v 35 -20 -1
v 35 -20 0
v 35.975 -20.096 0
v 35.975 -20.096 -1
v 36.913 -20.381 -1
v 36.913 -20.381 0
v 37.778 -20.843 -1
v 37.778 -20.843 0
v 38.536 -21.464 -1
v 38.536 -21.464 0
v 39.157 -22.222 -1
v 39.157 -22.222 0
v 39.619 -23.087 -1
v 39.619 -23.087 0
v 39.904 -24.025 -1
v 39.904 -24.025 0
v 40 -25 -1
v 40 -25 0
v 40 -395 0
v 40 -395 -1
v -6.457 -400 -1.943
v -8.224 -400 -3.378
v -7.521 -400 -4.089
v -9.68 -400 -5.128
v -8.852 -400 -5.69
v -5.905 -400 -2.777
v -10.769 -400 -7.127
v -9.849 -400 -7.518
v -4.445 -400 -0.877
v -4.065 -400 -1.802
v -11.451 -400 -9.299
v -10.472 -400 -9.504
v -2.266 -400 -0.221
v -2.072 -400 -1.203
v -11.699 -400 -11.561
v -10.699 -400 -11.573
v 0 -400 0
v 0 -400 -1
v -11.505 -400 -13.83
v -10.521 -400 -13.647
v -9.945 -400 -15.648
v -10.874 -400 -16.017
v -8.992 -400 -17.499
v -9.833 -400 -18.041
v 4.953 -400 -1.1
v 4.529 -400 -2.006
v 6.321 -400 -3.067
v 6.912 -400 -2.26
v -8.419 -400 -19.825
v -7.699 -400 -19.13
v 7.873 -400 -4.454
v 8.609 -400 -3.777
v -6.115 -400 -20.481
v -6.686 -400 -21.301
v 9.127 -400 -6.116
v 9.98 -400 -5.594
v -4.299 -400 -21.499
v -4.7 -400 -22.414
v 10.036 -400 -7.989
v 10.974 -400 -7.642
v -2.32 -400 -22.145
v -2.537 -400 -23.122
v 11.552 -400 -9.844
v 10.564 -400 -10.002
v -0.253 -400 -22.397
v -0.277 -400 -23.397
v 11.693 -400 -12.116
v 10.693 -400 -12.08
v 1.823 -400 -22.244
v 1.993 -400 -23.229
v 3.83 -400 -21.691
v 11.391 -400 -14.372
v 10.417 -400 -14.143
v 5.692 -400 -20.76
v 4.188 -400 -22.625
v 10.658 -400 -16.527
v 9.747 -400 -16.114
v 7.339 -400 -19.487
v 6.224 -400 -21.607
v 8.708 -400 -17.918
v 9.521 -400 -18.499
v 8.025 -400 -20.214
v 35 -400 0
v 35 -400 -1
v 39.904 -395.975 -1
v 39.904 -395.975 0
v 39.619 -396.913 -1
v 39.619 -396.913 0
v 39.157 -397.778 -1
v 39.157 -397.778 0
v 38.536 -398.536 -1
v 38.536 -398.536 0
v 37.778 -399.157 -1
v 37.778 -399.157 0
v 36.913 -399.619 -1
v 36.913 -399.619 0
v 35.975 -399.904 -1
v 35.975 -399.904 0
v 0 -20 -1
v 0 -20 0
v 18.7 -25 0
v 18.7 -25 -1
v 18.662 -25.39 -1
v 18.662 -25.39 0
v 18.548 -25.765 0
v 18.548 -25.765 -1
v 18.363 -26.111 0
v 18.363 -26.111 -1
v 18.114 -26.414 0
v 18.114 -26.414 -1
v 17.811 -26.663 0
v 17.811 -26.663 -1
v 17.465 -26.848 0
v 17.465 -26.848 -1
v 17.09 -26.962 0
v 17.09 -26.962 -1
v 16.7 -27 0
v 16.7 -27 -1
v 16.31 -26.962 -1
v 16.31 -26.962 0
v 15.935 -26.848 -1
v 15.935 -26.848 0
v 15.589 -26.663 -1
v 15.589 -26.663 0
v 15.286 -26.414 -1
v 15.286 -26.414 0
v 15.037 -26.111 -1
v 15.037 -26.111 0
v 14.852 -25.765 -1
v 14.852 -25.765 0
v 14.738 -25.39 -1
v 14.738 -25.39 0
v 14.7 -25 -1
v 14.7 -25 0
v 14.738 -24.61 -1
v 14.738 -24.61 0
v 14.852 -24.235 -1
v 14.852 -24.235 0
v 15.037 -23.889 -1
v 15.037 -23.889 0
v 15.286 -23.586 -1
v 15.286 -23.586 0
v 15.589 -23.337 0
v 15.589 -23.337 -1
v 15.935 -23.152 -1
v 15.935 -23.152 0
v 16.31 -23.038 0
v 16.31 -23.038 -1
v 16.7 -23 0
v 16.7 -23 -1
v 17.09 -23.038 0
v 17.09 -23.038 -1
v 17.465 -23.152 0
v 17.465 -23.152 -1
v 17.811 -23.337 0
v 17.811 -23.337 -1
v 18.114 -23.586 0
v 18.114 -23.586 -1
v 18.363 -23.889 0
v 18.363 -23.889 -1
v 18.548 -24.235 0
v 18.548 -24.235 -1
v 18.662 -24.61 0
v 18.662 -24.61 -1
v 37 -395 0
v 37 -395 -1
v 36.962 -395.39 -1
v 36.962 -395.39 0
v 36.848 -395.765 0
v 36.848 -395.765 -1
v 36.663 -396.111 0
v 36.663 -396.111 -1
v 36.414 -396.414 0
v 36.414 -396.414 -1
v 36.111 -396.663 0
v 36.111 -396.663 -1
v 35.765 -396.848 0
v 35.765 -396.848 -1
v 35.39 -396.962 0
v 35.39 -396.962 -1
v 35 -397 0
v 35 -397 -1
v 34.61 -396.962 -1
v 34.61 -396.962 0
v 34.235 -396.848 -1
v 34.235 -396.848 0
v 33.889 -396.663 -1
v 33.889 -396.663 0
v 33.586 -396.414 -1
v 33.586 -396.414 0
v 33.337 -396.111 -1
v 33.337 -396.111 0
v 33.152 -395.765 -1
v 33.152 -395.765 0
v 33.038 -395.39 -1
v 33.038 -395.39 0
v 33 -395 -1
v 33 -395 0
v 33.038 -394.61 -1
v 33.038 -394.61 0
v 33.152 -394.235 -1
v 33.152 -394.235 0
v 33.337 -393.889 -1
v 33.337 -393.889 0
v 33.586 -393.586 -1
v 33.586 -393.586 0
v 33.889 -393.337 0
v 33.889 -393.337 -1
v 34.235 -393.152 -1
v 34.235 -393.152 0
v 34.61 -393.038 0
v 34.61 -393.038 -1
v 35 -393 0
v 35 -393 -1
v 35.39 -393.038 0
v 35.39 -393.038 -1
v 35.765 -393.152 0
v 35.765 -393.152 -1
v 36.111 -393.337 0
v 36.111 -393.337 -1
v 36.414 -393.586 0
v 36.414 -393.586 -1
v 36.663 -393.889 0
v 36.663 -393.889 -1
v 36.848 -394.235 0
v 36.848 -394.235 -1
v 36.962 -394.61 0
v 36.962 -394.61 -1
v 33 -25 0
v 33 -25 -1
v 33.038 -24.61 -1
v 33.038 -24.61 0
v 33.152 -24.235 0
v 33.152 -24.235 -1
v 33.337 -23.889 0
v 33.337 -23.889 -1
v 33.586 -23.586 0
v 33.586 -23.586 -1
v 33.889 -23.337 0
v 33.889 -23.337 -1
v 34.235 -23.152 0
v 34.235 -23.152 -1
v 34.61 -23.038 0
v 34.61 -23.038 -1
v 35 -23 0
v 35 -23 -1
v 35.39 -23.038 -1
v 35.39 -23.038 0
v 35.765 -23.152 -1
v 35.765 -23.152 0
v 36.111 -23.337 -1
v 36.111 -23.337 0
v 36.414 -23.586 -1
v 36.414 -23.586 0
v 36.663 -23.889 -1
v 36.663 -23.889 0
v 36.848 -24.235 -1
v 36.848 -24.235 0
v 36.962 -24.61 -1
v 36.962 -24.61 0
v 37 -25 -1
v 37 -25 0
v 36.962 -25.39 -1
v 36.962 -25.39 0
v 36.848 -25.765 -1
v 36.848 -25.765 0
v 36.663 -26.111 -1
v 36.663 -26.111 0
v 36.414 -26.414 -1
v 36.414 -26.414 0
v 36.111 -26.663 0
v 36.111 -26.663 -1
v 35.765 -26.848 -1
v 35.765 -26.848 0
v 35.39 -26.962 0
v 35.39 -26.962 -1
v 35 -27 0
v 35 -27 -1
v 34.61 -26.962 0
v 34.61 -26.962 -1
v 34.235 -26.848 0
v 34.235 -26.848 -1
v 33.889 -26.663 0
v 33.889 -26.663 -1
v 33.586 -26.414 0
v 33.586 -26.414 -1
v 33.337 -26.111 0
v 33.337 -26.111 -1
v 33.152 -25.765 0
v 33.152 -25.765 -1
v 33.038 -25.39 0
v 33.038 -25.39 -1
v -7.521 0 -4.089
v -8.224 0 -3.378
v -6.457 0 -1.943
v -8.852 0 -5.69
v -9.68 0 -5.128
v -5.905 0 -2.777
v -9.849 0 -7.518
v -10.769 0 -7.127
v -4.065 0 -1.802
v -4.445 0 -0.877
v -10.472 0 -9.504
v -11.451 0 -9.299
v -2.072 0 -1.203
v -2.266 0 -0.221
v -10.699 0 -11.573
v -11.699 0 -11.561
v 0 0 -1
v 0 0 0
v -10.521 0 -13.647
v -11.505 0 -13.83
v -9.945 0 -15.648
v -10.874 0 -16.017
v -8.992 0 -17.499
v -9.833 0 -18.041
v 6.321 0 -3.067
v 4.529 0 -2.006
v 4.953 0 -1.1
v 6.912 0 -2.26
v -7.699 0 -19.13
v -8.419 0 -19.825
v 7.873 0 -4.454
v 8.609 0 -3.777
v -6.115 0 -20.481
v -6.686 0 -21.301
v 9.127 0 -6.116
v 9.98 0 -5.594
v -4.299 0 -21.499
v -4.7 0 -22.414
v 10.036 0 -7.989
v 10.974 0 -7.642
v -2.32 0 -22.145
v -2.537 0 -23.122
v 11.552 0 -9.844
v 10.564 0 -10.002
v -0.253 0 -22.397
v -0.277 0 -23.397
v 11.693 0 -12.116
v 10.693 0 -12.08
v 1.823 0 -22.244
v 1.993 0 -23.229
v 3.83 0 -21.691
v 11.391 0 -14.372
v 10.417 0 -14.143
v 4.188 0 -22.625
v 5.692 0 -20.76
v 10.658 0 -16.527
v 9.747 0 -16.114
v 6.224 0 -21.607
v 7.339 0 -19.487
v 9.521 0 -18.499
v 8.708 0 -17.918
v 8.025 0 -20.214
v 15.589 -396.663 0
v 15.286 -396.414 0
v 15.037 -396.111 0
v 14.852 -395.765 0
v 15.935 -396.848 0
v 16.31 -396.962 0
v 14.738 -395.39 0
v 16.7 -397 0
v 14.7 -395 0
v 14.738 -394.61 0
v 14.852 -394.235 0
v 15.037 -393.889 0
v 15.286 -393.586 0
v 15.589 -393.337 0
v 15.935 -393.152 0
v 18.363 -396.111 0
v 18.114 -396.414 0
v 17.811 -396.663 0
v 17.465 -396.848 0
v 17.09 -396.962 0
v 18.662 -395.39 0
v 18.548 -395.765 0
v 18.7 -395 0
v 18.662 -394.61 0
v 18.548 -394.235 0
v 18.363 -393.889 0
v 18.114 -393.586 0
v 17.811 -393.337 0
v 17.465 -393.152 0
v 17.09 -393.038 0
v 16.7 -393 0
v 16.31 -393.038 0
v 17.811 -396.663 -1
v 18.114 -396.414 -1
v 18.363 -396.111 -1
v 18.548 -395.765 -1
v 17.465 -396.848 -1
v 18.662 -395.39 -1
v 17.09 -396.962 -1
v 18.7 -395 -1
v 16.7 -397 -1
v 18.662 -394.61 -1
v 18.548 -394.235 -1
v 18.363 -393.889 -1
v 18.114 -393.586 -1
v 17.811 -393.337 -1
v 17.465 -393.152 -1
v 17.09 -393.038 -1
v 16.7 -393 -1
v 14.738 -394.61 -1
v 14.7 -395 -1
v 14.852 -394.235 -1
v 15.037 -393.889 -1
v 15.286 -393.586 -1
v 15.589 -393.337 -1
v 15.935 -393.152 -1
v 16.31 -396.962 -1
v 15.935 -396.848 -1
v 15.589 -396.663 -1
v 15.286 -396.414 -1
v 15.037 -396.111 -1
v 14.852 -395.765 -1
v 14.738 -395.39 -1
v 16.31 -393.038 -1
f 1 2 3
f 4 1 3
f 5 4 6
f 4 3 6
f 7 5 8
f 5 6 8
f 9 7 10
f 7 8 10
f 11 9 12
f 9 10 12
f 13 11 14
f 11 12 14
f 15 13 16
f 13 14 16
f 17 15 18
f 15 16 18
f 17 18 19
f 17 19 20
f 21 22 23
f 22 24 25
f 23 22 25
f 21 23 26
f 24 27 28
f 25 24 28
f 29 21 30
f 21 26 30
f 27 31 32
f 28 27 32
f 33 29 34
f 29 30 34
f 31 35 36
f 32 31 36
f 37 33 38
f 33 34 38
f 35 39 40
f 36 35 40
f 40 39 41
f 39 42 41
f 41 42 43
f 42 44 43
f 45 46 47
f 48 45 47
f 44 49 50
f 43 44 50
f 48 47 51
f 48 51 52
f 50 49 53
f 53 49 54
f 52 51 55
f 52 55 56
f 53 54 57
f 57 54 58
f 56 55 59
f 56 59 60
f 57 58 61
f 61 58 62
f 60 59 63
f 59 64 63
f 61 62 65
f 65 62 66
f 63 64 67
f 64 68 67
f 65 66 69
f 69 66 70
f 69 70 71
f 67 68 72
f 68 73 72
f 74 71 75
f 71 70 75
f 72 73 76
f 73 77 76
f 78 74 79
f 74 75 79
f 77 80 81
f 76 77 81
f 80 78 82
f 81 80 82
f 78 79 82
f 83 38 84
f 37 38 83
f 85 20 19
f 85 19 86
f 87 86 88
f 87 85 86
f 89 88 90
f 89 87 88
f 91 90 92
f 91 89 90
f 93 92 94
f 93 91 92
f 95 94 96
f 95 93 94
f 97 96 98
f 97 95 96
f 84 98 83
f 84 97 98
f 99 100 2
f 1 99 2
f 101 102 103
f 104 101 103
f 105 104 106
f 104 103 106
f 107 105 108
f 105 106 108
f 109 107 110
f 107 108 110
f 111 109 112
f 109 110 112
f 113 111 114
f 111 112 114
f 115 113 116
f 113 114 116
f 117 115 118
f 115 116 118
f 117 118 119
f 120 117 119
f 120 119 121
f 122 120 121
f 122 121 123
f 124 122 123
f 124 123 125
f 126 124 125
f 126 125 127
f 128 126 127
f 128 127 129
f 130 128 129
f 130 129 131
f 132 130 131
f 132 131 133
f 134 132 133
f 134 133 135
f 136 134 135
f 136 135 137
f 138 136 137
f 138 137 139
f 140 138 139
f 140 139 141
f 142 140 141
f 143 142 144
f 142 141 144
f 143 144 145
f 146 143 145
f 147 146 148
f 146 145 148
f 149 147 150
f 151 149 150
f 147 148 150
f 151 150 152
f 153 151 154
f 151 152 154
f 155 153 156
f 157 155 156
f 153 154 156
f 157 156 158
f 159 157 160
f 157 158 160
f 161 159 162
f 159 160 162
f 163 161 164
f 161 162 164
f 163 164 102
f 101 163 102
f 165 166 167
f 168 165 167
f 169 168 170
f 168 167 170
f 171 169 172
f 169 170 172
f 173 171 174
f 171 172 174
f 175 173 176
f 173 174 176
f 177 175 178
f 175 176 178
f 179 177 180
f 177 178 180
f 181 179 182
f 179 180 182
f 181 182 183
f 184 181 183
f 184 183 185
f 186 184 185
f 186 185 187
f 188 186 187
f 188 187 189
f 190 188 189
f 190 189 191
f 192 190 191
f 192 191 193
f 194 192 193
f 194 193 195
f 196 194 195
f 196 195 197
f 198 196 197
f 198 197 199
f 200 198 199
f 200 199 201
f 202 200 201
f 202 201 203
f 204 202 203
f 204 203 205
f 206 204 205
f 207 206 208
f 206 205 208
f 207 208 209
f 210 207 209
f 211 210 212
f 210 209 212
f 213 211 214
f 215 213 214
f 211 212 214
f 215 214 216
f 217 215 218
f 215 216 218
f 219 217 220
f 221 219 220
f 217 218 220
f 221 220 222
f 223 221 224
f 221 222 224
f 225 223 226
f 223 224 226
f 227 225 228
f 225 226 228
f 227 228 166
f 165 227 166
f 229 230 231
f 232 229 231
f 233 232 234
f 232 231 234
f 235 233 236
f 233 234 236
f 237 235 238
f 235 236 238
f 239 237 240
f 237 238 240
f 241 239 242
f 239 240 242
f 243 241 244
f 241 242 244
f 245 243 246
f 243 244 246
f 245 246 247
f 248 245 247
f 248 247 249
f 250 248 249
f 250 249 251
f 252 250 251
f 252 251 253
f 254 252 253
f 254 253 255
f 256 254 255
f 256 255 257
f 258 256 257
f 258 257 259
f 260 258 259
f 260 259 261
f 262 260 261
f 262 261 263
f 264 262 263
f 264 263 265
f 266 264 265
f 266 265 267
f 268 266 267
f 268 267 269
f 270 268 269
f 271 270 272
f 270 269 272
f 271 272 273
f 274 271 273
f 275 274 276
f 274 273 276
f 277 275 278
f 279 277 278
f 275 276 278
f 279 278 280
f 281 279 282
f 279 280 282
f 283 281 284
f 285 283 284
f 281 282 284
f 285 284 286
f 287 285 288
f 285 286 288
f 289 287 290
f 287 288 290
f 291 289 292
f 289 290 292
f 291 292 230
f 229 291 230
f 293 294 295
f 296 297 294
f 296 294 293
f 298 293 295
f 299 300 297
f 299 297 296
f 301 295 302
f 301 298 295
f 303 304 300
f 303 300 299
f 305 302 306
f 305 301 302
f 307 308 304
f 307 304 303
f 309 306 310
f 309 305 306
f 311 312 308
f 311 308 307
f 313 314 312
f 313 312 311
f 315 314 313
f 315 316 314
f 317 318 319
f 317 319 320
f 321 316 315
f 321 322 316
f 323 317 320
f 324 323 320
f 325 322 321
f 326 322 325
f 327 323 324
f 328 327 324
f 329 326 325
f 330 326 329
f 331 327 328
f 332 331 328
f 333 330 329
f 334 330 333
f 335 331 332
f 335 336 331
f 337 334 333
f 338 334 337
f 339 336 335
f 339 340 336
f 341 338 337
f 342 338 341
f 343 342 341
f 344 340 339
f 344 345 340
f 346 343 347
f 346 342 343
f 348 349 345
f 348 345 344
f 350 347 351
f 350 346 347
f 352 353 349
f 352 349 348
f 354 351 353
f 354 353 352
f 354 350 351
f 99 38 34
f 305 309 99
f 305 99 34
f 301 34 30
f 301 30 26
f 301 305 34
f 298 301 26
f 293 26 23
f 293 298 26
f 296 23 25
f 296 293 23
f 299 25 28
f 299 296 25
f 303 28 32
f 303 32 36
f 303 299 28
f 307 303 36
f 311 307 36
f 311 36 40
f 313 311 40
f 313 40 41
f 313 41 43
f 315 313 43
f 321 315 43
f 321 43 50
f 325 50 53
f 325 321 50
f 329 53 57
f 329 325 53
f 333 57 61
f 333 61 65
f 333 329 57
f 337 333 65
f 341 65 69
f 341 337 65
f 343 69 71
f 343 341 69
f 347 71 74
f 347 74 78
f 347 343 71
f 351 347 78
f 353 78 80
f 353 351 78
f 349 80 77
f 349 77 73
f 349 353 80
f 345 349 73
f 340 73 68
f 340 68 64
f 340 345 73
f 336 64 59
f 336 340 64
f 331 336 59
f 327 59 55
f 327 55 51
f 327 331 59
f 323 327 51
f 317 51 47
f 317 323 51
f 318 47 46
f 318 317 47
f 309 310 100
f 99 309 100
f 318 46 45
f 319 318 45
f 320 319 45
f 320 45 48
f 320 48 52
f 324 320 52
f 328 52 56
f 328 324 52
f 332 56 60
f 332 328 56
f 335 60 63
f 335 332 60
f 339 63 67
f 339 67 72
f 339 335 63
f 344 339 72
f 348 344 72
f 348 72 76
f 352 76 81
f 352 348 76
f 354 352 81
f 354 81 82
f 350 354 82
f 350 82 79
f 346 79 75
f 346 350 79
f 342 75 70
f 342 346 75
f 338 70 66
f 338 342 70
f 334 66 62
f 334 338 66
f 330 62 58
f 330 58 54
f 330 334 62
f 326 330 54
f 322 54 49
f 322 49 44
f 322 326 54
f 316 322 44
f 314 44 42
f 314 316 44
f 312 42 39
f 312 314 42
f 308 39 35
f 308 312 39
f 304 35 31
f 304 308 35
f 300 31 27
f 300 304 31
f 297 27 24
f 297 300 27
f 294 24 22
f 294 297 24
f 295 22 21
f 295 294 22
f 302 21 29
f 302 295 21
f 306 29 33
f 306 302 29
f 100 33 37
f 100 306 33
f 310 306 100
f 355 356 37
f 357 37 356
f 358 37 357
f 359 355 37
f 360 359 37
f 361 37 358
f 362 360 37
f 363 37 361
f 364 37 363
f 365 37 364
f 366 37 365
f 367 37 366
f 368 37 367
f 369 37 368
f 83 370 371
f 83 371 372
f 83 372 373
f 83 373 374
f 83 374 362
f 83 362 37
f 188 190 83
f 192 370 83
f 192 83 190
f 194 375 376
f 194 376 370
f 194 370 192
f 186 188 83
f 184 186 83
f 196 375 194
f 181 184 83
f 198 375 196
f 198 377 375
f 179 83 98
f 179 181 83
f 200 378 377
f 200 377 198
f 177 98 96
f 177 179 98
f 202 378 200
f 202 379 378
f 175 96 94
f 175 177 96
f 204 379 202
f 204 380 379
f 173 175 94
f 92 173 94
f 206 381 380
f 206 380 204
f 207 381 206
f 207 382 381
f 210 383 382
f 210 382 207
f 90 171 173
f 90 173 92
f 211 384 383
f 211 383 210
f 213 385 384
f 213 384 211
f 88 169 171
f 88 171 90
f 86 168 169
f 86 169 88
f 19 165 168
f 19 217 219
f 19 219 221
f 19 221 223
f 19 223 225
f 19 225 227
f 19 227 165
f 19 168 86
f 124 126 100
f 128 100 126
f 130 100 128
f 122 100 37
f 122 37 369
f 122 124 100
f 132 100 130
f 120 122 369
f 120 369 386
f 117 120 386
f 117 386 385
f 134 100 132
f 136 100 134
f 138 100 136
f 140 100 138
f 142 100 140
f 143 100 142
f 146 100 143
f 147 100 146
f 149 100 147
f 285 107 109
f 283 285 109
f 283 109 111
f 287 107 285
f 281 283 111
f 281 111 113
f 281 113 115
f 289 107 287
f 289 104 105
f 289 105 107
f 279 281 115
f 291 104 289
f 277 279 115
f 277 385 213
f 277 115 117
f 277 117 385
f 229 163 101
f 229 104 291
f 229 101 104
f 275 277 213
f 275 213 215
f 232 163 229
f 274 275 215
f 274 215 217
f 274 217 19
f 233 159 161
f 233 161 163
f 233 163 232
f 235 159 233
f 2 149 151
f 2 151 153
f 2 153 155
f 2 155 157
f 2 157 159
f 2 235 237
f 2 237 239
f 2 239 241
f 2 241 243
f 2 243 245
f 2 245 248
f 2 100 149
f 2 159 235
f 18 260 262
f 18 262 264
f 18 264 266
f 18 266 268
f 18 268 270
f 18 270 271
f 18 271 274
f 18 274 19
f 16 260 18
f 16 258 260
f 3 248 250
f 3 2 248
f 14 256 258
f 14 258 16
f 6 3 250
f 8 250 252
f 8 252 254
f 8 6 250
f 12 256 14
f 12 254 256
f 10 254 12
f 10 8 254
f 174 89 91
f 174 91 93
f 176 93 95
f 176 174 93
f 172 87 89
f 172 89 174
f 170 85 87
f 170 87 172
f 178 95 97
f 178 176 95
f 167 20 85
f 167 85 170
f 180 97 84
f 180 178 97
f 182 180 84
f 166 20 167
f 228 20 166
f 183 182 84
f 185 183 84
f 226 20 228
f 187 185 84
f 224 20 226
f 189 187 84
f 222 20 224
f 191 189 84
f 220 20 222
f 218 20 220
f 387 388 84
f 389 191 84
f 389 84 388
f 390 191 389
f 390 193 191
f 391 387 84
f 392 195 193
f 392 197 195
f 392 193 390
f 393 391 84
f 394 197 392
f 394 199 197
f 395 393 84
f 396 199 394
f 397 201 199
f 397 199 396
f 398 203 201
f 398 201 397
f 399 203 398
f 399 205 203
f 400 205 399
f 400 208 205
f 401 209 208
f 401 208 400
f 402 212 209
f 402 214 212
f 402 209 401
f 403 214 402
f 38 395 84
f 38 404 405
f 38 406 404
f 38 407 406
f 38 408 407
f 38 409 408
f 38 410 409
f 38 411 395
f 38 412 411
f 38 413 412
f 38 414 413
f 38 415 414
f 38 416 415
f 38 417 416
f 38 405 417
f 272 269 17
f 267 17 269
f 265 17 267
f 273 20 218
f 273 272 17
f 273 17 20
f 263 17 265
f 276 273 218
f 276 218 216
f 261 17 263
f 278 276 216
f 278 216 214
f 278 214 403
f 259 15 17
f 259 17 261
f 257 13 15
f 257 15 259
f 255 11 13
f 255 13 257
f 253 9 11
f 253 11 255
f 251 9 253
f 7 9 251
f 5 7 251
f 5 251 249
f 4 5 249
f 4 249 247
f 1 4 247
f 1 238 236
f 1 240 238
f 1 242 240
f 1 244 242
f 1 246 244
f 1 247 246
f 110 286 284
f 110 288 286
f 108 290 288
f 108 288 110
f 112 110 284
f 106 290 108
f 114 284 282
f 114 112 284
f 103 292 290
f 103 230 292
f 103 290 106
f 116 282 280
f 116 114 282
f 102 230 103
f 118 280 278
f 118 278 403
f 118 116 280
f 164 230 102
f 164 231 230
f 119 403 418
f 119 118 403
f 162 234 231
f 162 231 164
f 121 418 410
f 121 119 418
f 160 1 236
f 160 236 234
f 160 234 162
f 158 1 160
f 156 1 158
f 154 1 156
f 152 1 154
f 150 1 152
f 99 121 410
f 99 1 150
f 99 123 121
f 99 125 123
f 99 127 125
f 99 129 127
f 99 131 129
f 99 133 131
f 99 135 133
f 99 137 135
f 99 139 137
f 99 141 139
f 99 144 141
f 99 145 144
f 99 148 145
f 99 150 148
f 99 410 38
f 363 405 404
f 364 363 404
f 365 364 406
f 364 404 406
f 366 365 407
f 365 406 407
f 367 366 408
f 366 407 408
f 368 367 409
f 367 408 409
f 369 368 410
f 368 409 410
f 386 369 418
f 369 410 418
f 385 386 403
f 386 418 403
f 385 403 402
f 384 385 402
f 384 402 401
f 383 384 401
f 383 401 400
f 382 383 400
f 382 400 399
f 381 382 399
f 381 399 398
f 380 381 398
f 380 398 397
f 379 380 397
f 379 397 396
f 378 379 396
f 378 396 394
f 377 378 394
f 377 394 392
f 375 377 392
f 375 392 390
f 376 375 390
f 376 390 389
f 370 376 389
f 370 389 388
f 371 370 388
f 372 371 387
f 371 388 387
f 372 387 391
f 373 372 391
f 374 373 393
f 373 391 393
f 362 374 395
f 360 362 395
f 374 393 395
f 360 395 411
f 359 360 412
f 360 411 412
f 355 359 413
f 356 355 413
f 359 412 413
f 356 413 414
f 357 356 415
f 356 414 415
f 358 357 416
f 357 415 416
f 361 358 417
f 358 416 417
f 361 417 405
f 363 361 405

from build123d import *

# Parameters (mm, degrees)
ODGI_CIE_BAZOWE1_DEPTH     = 400
WYTNIJ_WYCI_GNI_CIE1_REACH = 404.676
OTWORY_POD_NITY_R          = 2
WYTNIJ_WYCI_GNI_CIE2_DEPTH = 403.618628481


# Sheet-metal steps are written as plain solids
with BuildPart() as part:
    # Szkic1 → Odgięcie bazowe1 (new body)
    with BuildSketch(Plane(origin=(0, 0, 0), x_dir=(1, 0, 0), z_dir=(0, 1, 0))):
        with BuildLine():
            ThreePointArc((4.952776999, 1.1), (-2.536730179, 23.121689892), (0, 0))
            Line((0, 0), (40, 0))
            Line((40, 0), (40, 1))
            Line((40, 1), (0, 1))
            ThreePointArc((0, 1), (-2.319915634, 22.145477081), (4.529462725, 2.005982906))
            Line((4.529462725, 2.005982906), (4.952776999, 1.1))
        make_face()
    extrude(amount=-ODGI_CIE_BAZOWE1_DEPTH)

    # Szkic6 → Wytnij-wyciągnięcie1 (cut, up to next)
    with BuildSketch(Plane.XY, mode=Mode.PRIVATE) as wytnij_wyci_gni_cie1_sk1:
        with BuildLine():
            Line((0, 0), (0, -20))
            Line((0, -20), (35, -20))
            ThreePointArc((35, -20), (38.535533906, -21.464466094), (40, -25))
            Line((40, -25), (40, -20))
            Line((40, -20), (40, 0))
            Line((40, 0), (0, 0))
        make_face()
    wytnij_wyci_gni_cie1_tool1 = extrude(wytnij_wyci_gni_cie1_sk1.sketch, amount=-WYTNIJ_WYCI_GNI_CIE1_REACH, mode=Mode.PRIVATE) & part.part
    add(wytnij_wyci_gni_cie1_tool1.solids().sort_by_distance((20.125793, -10.074056, 0))[0], mode=Mode.SUBTRACT)

    # otwory pod nity → Wytnij-wyciągnięcie2 (cut, through all)
    with BuildSketch(Plane(origin=(0, 0, -1), x_dir=(-1, 0, 0), z_dir=(0, 0, -1))):
        with Locations((-35, -25)):
            Circle(OTWORY_POD_NITY_R)
        with Locations(Location((-16.7, -25, 0), (0, 0, 180))):
            Circle(OTWORY_POD_NITY_R)
        with Locations((-16.7, -395)):
            Circle(OTWORY_POD_NITY_R)
        with Locations(Location((-35, -395, 0), (0, 0, 180))):
            Circle(OTWORY_POD_NITY_R)
        with BuildLine():
            Line((-35, -400), (-40, -400))
            Line((-40, -400), (-40, -395))
            ThreePointArc((-40, -395), (-38.535533906, -398.535533906), (-35, -400))
        make_face()
    extrude(amount=-WYTNIJ_WYCI_GNI_CIE2_DEPTH, mode=Mode.SUBTRACT)


solid = part.part
